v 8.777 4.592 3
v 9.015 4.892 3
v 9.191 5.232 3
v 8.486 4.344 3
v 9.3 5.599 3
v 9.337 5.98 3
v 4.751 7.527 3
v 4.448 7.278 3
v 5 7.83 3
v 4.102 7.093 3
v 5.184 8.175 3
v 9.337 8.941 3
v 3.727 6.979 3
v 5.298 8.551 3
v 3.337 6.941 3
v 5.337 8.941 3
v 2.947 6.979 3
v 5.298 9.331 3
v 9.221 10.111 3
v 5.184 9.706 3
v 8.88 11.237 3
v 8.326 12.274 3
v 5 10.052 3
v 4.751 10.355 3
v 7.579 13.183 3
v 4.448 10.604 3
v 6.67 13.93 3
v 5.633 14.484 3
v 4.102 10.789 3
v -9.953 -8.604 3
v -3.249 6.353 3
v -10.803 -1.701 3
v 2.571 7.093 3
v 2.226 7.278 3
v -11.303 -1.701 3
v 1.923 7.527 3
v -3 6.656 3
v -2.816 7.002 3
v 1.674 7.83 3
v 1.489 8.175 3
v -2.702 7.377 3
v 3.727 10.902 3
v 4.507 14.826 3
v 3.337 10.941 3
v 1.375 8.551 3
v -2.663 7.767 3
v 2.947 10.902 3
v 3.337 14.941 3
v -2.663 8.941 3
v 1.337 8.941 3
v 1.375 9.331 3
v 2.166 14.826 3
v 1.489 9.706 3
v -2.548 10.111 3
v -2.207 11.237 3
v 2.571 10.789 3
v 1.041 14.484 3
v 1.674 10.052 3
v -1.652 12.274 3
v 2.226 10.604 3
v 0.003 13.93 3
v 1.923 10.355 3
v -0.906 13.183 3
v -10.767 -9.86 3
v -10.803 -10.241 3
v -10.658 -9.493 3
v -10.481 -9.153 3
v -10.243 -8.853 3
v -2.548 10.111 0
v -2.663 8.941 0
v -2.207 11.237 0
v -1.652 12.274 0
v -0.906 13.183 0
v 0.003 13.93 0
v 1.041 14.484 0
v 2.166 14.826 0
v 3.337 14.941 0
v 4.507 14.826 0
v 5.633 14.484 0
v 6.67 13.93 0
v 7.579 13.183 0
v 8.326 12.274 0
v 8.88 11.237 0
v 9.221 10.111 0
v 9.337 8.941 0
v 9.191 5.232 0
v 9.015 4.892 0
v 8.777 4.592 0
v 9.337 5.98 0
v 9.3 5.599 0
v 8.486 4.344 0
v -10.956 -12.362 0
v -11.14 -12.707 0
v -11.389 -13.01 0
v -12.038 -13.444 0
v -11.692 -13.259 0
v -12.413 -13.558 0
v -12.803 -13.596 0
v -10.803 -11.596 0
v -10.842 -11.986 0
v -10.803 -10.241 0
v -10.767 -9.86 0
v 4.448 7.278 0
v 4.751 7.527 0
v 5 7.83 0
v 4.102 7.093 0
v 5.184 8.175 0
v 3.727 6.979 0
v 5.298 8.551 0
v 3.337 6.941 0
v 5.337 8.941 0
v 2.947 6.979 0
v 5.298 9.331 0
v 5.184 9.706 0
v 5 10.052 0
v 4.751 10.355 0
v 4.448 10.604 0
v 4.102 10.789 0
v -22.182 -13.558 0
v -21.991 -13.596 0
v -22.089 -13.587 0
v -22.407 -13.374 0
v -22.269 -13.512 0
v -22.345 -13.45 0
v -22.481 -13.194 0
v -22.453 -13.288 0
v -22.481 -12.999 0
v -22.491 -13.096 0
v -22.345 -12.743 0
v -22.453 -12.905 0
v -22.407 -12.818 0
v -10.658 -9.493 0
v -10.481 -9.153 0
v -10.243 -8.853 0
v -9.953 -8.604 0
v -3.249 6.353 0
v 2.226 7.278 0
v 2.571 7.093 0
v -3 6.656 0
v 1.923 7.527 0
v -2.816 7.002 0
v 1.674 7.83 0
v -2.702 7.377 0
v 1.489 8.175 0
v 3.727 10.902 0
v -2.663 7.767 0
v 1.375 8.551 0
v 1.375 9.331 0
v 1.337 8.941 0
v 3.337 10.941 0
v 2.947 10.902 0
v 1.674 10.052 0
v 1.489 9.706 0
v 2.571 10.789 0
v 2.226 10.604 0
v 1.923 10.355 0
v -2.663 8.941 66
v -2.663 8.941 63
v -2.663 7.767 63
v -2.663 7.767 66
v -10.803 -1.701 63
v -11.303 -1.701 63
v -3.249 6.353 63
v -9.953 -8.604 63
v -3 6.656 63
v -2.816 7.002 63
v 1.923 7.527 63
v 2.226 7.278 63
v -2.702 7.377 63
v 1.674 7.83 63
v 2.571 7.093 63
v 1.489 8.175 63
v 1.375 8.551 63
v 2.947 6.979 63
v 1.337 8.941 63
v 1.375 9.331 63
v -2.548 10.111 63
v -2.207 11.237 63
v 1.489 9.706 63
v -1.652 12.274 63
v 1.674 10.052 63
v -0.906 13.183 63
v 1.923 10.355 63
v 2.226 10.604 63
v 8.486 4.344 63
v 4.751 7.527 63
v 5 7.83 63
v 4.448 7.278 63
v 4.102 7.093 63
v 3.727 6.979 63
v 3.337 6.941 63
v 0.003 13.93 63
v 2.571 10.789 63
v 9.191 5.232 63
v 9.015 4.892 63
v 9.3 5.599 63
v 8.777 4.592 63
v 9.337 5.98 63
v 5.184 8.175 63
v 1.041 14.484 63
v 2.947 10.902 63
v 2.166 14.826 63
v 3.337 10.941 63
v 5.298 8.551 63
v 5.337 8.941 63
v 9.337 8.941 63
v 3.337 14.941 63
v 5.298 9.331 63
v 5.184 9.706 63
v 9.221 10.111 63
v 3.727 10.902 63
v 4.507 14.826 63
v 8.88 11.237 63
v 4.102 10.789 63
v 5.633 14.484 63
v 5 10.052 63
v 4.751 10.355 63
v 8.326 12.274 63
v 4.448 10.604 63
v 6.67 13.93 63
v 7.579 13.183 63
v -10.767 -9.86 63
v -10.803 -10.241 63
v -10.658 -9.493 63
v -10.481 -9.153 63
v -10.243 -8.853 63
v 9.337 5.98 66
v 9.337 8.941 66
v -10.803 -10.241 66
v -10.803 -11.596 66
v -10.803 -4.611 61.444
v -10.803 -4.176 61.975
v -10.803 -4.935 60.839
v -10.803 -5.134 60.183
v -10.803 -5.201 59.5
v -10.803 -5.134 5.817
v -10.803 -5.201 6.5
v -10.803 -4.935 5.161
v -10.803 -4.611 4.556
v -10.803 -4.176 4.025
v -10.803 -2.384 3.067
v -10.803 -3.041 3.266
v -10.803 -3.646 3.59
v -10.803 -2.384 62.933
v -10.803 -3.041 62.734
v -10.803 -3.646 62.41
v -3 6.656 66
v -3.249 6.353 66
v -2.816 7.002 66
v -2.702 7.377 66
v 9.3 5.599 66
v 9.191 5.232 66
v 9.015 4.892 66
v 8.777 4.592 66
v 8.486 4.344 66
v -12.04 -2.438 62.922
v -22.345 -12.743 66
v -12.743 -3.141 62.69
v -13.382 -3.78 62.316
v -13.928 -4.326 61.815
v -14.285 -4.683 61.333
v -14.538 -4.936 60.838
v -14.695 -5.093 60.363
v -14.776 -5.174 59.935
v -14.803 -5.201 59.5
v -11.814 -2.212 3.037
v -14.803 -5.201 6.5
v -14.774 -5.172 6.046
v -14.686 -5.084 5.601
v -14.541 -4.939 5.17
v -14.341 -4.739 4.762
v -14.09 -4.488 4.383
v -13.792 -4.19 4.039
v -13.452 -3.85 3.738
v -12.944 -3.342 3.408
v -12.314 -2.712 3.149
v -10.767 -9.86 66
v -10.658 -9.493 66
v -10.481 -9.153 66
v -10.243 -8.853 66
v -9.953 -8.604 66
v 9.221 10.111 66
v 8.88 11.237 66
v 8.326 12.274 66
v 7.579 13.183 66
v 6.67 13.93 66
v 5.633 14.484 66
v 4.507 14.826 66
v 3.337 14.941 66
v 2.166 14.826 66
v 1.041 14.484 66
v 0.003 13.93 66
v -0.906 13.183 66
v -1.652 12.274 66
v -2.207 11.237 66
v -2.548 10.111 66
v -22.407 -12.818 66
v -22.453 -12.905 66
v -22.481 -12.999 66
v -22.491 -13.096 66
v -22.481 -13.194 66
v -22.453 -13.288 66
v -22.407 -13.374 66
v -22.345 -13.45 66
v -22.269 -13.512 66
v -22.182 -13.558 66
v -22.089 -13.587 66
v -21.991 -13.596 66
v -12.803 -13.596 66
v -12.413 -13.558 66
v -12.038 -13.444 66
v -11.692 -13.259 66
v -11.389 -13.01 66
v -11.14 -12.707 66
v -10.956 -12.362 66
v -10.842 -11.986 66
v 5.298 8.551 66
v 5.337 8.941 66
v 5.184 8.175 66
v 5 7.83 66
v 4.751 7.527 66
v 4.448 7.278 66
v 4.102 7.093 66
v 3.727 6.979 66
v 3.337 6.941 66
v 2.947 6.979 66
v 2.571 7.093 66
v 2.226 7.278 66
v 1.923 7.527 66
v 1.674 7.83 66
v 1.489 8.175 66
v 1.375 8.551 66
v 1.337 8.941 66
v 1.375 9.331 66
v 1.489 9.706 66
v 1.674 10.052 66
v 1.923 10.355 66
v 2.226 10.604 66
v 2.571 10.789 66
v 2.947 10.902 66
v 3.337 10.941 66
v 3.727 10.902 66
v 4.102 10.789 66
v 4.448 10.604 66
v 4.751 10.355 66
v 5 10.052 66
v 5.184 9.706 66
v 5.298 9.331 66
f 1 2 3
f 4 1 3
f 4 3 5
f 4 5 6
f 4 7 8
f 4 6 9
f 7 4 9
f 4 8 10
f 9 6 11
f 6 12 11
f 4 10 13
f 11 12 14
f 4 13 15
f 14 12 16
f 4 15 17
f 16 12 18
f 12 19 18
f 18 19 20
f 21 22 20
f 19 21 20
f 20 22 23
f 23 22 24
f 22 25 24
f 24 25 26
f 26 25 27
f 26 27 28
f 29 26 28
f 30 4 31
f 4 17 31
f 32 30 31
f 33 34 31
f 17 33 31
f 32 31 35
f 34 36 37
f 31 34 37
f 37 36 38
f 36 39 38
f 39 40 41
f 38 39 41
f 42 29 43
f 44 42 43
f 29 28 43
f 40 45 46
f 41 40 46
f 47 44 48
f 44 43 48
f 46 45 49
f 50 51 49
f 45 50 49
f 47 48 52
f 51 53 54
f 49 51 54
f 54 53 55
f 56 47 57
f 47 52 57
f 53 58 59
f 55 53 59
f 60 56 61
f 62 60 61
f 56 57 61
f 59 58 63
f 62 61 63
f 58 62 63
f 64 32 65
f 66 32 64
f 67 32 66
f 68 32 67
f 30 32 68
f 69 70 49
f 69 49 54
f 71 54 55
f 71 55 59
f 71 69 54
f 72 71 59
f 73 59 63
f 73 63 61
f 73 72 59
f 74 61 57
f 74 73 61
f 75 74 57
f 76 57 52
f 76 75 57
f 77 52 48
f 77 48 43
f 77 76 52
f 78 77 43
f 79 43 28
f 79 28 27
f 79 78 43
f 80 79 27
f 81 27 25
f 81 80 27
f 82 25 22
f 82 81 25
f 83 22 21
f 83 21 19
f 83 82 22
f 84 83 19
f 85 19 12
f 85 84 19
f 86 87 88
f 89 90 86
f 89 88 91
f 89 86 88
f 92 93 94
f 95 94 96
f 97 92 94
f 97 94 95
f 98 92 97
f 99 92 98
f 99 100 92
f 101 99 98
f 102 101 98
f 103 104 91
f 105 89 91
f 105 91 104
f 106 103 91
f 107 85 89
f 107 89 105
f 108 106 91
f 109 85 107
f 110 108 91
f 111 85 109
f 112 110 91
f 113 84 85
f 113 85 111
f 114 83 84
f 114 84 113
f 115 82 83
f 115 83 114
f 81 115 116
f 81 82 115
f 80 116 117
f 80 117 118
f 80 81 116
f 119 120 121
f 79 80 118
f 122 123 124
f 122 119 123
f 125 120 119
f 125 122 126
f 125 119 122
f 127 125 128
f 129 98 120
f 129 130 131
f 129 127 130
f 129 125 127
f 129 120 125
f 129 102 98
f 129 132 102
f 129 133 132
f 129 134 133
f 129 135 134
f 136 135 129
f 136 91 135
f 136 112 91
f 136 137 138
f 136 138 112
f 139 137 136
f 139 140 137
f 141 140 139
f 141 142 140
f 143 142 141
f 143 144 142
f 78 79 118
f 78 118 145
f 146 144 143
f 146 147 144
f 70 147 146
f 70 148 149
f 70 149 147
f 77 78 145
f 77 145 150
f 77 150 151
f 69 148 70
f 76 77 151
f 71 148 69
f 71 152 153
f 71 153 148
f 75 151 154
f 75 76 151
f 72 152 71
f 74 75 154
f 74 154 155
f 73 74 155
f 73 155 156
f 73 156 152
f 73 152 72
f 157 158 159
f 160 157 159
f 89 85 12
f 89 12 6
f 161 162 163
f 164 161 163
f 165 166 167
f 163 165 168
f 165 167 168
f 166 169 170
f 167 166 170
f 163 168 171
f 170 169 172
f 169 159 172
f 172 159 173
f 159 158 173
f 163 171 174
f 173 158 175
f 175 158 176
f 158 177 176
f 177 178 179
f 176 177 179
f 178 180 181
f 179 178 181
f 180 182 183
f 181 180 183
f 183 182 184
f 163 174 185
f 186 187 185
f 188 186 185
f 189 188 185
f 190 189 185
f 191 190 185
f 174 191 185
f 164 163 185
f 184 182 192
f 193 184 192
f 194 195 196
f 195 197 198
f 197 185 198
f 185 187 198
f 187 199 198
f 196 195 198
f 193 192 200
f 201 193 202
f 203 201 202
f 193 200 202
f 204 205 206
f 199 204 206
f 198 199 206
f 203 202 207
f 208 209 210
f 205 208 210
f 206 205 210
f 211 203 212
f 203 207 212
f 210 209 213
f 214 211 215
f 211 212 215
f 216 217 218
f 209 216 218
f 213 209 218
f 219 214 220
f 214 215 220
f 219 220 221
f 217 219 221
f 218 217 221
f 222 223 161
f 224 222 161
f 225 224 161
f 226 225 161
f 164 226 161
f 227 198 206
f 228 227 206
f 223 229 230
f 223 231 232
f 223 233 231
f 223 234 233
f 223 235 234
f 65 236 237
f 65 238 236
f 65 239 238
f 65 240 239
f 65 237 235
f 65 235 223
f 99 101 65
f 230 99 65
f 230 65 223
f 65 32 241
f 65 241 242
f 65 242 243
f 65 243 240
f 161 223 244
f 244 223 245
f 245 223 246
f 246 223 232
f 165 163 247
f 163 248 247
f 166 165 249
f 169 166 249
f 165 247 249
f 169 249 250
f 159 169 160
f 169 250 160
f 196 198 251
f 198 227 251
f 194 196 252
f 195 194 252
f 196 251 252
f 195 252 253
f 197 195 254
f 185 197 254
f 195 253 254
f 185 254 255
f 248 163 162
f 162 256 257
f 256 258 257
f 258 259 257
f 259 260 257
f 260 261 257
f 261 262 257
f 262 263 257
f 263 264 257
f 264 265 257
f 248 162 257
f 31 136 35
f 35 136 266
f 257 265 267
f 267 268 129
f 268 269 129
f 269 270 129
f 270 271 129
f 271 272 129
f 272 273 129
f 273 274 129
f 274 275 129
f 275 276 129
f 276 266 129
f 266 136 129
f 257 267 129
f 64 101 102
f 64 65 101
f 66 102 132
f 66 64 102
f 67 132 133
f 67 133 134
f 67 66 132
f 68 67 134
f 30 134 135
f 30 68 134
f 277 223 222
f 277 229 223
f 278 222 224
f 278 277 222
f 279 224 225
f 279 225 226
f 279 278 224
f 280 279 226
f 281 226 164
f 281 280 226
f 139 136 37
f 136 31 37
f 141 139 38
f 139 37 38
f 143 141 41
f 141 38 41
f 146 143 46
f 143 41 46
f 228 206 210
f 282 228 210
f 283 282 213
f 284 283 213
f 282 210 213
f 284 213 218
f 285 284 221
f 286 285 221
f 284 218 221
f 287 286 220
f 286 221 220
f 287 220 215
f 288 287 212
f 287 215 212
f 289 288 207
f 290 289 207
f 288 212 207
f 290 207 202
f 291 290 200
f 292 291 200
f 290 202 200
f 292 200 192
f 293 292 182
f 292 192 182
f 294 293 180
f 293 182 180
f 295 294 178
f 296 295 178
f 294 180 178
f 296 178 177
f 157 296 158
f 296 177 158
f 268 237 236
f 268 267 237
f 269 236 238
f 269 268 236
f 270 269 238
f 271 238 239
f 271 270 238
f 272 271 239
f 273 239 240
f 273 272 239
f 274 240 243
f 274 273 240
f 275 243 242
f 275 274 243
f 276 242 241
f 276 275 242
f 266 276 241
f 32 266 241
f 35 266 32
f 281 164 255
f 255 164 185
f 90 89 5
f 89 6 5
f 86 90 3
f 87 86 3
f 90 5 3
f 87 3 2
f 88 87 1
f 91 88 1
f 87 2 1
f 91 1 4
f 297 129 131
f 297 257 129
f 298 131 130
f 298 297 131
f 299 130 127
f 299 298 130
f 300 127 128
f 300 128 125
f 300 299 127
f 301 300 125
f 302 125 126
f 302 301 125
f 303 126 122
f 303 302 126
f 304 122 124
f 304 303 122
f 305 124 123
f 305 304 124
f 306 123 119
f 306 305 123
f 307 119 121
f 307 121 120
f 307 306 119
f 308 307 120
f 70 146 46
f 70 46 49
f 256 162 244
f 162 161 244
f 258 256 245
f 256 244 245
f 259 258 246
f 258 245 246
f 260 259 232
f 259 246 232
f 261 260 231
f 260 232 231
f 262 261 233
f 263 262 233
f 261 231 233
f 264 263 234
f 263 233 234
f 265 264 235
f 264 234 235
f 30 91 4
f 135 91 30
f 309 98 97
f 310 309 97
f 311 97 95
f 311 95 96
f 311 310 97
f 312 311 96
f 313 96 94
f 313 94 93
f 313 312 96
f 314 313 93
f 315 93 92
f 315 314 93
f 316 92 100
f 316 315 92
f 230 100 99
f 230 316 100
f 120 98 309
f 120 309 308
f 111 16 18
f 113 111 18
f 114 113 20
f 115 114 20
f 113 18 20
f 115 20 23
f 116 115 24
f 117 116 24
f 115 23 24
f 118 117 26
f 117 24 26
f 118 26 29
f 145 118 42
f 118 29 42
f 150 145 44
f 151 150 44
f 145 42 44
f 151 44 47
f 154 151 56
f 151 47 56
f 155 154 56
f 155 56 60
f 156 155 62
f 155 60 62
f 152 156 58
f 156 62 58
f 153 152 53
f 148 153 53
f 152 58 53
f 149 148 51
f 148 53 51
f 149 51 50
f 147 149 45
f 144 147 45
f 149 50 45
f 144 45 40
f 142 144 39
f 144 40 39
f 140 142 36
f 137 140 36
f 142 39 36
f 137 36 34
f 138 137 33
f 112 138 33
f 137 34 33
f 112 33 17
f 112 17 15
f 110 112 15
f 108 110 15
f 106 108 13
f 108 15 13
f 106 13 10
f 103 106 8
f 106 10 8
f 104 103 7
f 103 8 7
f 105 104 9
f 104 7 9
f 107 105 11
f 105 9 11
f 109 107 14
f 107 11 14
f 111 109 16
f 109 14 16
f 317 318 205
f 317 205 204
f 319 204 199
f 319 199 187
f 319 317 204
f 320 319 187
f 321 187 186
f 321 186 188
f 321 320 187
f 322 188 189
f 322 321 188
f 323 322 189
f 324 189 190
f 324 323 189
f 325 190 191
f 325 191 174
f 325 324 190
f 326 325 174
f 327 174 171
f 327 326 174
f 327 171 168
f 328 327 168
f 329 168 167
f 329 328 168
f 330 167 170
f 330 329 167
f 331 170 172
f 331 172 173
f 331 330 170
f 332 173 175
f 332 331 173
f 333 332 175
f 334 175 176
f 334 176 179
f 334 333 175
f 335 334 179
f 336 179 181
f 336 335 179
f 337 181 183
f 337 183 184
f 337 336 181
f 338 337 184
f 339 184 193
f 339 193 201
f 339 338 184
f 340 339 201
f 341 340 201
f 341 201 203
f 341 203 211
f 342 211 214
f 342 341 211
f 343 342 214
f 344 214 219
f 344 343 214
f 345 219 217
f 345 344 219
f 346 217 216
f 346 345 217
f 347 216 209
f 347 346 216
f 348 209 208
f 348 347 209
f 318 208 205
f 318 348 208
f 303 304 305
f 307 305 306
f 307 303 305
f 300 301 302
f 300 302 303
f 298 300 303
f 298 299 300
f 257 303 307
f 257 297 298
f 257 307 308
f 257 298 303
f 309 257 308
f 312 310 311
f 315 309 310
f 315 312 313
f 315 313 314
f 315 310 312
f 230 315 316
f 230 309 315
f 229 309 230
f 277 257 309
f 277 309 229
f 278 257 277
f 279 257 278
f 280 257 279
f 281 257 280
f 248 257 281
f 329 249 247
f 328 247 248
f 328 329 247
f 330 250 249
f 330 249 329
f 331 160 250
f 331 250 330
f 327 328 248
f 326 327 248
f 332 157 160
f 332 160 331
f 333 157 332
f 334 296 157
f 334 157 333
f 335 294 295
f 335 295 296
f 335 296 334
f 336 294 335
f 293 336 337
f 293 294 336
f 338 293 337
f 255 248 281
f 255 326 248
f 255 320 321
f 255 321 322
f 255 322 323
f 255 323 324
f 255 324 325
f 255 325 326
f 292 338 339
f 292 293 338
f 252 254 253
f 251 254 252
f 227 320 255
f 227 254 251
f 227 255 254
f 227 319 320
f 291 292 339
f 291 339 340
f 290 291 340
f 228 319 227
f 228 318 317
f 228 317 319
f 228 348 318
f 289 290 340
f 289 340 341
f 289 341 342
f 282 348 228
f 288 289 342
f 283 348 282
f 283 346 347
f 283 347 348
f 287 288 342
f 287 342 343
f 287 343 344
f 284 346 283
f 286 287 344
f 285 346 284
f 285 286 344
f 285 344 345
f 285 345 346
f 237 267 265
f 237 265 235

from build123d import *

# Parameters (mm, degrees)
EXTRUDE1_DEPTH = 3
EXTRUDE2_DEPTH = 66
EXTRUDE3_START = -3
EXTRUDE3_DEPTH = 3
SKETCH2_R      = 2
EXTRUDE4_DEPTH = 3
EXTRUDE5_START = -3
SKETCH6_R      = 2
EXTRUDE5_DEPTH = 3
FILLET3_R      = 3.5
FILLET6_R      = 2
FILLET7_R      = 0.5
FILLET13_R     = 2


with BuildPart() as part:
    # Sketch1 → Extrude1 (new body)
    with BuildSketch(Plane.XY):
        with BuildLine():
            Line((-14.803266257, -5.201299994), (-2.663266257, 6.938700006))
            Line((-2.663266257, 6.938700006), (-2.663266257, 8.94083563))
            ThreePointArc((-2.663266257, 8.94083563), (3.336733743, 14.94083563), (9.336733743, 8.94083563))
            Line((9.336733743, 8.94083563), (9.336733743, 4.94083563))
            Line((9.336733743, 4.94083563), (-10.803266257, -9.201299994))
            Line((-10.803266257, -9.201299994), (-10.803266257, -5.201299994))
            Line((-10.803266257, -5.201299994), (-14.803266257, -5.201299994))
        make_face()
    extrude(amount=EXTRUDE1_DEPTH)

    # Sketch3 → Extrude2 (add)
    with BuildSketch(Plane.XY):
        Polygon((-14.803266257, -5.201299994), (-10.803266257, -5.201299994), (-10.803266257, -13.596193084), (-23.198159347, -13.596193084), align=None)
    extrude(amount=EXTRUDE2_DEPTH)

    # Sketch4 → Extrude3 (add)
    with BuildSketch(Plane.XY.offset(66).offset(EXTRUDE3_START)):
        with BuildLine():
            Line((-14.803266257, -5.201299994), (-10.803266257, -5.201299994))
            Line((-10.803266257, -5.201299994), (-10.803266257, -9.201299994))
            Line((-10.803266257, -9.201299994), (9.336733743, 4.94083563))
            Line((9.336733743, 4.94083563), (9.336733743, 8.94083563))
            ThreePointArc((9.336733743, 8.94083563), (3.336733743, 14.94083563), (-2.663266257, 8.94083563))
            Line((-2.663266257, 8.94083563), (-2.663266257, 6.938700006))
            Line((-2.663266257, 6.938700006), (-14.803266257, -5.201299994))
        make_face()
    extrude(amount=EXTRUDE3_DEPTH)

    # Sketch2 → Extrude4 (cut)
    with BuildSketch(Plane.XY.offset(3)):
        with Locations((3.336733743, 8.94083563)):
            Circle(SKETCH2_R)
    extrude(amount=-EXTRUDE4_DEPTH, mode=Mode.SUBTRACT)

    # Sketch6 → Extrude5 (cut)
    with BuildSketch(Plane(origin=(0, 0, 63), x_dir=(-1, 0, 0), z_dir=(0, 0, -1)).offset(EXTRUDE5_START)):
        with Locations(Location((-3.336733743, 8.94083563, 0), (0, 0, 180))):
            Circle(SKETCH6_R)
    extrude(amount=EXTRUDE5_DEPTH, mode=Mode.SUBTRACT)

    # Fillet3
    fillet3_edges = [part.edges().sort_by_distance(p)[0] for p in [
        (-12.803266257, -5.201299994, 3),
        (-12.803266257, -5.201299994, 63),
    ]]
    fillet(fillet3_edges, radius=FILLET3_R)

    # Fillet6
    fillet6_edges = [part.edges().sort_by_distance(p)[0] for p in [
        (9.336733743, 4.94083563, 1.5),
        (-2.663266257, 6.938700006, 1.5),
        (-2.663266257, 6.938700006, 64.5),
        (9.336733743, 4.94083563, 64.5),
    ]]
    fillet(fillet6_edges, radius=FILLET6_R)

    # Fillet7
    fillet7_edges = [part.edges().sort_by_distance(p)[0] for p in [
        (-23.198159347, -13.596193084, 33),
    ]]
    fillet(fillet7_edges, radius=FILLET7_R)

    # Fillet13
    fillet13_edges = [part.edges().sort_by_distance(p)[0] for p in [
        (-10.803266257, -9.201299994, 1.5),
        (-10.803266257, -13.596193084, 33),
        (-10.803266257, -9.201299994, 64.5),
    ]]
    fillet(fillet13_edges, radius=FILLET13_R)


solid = part.part
